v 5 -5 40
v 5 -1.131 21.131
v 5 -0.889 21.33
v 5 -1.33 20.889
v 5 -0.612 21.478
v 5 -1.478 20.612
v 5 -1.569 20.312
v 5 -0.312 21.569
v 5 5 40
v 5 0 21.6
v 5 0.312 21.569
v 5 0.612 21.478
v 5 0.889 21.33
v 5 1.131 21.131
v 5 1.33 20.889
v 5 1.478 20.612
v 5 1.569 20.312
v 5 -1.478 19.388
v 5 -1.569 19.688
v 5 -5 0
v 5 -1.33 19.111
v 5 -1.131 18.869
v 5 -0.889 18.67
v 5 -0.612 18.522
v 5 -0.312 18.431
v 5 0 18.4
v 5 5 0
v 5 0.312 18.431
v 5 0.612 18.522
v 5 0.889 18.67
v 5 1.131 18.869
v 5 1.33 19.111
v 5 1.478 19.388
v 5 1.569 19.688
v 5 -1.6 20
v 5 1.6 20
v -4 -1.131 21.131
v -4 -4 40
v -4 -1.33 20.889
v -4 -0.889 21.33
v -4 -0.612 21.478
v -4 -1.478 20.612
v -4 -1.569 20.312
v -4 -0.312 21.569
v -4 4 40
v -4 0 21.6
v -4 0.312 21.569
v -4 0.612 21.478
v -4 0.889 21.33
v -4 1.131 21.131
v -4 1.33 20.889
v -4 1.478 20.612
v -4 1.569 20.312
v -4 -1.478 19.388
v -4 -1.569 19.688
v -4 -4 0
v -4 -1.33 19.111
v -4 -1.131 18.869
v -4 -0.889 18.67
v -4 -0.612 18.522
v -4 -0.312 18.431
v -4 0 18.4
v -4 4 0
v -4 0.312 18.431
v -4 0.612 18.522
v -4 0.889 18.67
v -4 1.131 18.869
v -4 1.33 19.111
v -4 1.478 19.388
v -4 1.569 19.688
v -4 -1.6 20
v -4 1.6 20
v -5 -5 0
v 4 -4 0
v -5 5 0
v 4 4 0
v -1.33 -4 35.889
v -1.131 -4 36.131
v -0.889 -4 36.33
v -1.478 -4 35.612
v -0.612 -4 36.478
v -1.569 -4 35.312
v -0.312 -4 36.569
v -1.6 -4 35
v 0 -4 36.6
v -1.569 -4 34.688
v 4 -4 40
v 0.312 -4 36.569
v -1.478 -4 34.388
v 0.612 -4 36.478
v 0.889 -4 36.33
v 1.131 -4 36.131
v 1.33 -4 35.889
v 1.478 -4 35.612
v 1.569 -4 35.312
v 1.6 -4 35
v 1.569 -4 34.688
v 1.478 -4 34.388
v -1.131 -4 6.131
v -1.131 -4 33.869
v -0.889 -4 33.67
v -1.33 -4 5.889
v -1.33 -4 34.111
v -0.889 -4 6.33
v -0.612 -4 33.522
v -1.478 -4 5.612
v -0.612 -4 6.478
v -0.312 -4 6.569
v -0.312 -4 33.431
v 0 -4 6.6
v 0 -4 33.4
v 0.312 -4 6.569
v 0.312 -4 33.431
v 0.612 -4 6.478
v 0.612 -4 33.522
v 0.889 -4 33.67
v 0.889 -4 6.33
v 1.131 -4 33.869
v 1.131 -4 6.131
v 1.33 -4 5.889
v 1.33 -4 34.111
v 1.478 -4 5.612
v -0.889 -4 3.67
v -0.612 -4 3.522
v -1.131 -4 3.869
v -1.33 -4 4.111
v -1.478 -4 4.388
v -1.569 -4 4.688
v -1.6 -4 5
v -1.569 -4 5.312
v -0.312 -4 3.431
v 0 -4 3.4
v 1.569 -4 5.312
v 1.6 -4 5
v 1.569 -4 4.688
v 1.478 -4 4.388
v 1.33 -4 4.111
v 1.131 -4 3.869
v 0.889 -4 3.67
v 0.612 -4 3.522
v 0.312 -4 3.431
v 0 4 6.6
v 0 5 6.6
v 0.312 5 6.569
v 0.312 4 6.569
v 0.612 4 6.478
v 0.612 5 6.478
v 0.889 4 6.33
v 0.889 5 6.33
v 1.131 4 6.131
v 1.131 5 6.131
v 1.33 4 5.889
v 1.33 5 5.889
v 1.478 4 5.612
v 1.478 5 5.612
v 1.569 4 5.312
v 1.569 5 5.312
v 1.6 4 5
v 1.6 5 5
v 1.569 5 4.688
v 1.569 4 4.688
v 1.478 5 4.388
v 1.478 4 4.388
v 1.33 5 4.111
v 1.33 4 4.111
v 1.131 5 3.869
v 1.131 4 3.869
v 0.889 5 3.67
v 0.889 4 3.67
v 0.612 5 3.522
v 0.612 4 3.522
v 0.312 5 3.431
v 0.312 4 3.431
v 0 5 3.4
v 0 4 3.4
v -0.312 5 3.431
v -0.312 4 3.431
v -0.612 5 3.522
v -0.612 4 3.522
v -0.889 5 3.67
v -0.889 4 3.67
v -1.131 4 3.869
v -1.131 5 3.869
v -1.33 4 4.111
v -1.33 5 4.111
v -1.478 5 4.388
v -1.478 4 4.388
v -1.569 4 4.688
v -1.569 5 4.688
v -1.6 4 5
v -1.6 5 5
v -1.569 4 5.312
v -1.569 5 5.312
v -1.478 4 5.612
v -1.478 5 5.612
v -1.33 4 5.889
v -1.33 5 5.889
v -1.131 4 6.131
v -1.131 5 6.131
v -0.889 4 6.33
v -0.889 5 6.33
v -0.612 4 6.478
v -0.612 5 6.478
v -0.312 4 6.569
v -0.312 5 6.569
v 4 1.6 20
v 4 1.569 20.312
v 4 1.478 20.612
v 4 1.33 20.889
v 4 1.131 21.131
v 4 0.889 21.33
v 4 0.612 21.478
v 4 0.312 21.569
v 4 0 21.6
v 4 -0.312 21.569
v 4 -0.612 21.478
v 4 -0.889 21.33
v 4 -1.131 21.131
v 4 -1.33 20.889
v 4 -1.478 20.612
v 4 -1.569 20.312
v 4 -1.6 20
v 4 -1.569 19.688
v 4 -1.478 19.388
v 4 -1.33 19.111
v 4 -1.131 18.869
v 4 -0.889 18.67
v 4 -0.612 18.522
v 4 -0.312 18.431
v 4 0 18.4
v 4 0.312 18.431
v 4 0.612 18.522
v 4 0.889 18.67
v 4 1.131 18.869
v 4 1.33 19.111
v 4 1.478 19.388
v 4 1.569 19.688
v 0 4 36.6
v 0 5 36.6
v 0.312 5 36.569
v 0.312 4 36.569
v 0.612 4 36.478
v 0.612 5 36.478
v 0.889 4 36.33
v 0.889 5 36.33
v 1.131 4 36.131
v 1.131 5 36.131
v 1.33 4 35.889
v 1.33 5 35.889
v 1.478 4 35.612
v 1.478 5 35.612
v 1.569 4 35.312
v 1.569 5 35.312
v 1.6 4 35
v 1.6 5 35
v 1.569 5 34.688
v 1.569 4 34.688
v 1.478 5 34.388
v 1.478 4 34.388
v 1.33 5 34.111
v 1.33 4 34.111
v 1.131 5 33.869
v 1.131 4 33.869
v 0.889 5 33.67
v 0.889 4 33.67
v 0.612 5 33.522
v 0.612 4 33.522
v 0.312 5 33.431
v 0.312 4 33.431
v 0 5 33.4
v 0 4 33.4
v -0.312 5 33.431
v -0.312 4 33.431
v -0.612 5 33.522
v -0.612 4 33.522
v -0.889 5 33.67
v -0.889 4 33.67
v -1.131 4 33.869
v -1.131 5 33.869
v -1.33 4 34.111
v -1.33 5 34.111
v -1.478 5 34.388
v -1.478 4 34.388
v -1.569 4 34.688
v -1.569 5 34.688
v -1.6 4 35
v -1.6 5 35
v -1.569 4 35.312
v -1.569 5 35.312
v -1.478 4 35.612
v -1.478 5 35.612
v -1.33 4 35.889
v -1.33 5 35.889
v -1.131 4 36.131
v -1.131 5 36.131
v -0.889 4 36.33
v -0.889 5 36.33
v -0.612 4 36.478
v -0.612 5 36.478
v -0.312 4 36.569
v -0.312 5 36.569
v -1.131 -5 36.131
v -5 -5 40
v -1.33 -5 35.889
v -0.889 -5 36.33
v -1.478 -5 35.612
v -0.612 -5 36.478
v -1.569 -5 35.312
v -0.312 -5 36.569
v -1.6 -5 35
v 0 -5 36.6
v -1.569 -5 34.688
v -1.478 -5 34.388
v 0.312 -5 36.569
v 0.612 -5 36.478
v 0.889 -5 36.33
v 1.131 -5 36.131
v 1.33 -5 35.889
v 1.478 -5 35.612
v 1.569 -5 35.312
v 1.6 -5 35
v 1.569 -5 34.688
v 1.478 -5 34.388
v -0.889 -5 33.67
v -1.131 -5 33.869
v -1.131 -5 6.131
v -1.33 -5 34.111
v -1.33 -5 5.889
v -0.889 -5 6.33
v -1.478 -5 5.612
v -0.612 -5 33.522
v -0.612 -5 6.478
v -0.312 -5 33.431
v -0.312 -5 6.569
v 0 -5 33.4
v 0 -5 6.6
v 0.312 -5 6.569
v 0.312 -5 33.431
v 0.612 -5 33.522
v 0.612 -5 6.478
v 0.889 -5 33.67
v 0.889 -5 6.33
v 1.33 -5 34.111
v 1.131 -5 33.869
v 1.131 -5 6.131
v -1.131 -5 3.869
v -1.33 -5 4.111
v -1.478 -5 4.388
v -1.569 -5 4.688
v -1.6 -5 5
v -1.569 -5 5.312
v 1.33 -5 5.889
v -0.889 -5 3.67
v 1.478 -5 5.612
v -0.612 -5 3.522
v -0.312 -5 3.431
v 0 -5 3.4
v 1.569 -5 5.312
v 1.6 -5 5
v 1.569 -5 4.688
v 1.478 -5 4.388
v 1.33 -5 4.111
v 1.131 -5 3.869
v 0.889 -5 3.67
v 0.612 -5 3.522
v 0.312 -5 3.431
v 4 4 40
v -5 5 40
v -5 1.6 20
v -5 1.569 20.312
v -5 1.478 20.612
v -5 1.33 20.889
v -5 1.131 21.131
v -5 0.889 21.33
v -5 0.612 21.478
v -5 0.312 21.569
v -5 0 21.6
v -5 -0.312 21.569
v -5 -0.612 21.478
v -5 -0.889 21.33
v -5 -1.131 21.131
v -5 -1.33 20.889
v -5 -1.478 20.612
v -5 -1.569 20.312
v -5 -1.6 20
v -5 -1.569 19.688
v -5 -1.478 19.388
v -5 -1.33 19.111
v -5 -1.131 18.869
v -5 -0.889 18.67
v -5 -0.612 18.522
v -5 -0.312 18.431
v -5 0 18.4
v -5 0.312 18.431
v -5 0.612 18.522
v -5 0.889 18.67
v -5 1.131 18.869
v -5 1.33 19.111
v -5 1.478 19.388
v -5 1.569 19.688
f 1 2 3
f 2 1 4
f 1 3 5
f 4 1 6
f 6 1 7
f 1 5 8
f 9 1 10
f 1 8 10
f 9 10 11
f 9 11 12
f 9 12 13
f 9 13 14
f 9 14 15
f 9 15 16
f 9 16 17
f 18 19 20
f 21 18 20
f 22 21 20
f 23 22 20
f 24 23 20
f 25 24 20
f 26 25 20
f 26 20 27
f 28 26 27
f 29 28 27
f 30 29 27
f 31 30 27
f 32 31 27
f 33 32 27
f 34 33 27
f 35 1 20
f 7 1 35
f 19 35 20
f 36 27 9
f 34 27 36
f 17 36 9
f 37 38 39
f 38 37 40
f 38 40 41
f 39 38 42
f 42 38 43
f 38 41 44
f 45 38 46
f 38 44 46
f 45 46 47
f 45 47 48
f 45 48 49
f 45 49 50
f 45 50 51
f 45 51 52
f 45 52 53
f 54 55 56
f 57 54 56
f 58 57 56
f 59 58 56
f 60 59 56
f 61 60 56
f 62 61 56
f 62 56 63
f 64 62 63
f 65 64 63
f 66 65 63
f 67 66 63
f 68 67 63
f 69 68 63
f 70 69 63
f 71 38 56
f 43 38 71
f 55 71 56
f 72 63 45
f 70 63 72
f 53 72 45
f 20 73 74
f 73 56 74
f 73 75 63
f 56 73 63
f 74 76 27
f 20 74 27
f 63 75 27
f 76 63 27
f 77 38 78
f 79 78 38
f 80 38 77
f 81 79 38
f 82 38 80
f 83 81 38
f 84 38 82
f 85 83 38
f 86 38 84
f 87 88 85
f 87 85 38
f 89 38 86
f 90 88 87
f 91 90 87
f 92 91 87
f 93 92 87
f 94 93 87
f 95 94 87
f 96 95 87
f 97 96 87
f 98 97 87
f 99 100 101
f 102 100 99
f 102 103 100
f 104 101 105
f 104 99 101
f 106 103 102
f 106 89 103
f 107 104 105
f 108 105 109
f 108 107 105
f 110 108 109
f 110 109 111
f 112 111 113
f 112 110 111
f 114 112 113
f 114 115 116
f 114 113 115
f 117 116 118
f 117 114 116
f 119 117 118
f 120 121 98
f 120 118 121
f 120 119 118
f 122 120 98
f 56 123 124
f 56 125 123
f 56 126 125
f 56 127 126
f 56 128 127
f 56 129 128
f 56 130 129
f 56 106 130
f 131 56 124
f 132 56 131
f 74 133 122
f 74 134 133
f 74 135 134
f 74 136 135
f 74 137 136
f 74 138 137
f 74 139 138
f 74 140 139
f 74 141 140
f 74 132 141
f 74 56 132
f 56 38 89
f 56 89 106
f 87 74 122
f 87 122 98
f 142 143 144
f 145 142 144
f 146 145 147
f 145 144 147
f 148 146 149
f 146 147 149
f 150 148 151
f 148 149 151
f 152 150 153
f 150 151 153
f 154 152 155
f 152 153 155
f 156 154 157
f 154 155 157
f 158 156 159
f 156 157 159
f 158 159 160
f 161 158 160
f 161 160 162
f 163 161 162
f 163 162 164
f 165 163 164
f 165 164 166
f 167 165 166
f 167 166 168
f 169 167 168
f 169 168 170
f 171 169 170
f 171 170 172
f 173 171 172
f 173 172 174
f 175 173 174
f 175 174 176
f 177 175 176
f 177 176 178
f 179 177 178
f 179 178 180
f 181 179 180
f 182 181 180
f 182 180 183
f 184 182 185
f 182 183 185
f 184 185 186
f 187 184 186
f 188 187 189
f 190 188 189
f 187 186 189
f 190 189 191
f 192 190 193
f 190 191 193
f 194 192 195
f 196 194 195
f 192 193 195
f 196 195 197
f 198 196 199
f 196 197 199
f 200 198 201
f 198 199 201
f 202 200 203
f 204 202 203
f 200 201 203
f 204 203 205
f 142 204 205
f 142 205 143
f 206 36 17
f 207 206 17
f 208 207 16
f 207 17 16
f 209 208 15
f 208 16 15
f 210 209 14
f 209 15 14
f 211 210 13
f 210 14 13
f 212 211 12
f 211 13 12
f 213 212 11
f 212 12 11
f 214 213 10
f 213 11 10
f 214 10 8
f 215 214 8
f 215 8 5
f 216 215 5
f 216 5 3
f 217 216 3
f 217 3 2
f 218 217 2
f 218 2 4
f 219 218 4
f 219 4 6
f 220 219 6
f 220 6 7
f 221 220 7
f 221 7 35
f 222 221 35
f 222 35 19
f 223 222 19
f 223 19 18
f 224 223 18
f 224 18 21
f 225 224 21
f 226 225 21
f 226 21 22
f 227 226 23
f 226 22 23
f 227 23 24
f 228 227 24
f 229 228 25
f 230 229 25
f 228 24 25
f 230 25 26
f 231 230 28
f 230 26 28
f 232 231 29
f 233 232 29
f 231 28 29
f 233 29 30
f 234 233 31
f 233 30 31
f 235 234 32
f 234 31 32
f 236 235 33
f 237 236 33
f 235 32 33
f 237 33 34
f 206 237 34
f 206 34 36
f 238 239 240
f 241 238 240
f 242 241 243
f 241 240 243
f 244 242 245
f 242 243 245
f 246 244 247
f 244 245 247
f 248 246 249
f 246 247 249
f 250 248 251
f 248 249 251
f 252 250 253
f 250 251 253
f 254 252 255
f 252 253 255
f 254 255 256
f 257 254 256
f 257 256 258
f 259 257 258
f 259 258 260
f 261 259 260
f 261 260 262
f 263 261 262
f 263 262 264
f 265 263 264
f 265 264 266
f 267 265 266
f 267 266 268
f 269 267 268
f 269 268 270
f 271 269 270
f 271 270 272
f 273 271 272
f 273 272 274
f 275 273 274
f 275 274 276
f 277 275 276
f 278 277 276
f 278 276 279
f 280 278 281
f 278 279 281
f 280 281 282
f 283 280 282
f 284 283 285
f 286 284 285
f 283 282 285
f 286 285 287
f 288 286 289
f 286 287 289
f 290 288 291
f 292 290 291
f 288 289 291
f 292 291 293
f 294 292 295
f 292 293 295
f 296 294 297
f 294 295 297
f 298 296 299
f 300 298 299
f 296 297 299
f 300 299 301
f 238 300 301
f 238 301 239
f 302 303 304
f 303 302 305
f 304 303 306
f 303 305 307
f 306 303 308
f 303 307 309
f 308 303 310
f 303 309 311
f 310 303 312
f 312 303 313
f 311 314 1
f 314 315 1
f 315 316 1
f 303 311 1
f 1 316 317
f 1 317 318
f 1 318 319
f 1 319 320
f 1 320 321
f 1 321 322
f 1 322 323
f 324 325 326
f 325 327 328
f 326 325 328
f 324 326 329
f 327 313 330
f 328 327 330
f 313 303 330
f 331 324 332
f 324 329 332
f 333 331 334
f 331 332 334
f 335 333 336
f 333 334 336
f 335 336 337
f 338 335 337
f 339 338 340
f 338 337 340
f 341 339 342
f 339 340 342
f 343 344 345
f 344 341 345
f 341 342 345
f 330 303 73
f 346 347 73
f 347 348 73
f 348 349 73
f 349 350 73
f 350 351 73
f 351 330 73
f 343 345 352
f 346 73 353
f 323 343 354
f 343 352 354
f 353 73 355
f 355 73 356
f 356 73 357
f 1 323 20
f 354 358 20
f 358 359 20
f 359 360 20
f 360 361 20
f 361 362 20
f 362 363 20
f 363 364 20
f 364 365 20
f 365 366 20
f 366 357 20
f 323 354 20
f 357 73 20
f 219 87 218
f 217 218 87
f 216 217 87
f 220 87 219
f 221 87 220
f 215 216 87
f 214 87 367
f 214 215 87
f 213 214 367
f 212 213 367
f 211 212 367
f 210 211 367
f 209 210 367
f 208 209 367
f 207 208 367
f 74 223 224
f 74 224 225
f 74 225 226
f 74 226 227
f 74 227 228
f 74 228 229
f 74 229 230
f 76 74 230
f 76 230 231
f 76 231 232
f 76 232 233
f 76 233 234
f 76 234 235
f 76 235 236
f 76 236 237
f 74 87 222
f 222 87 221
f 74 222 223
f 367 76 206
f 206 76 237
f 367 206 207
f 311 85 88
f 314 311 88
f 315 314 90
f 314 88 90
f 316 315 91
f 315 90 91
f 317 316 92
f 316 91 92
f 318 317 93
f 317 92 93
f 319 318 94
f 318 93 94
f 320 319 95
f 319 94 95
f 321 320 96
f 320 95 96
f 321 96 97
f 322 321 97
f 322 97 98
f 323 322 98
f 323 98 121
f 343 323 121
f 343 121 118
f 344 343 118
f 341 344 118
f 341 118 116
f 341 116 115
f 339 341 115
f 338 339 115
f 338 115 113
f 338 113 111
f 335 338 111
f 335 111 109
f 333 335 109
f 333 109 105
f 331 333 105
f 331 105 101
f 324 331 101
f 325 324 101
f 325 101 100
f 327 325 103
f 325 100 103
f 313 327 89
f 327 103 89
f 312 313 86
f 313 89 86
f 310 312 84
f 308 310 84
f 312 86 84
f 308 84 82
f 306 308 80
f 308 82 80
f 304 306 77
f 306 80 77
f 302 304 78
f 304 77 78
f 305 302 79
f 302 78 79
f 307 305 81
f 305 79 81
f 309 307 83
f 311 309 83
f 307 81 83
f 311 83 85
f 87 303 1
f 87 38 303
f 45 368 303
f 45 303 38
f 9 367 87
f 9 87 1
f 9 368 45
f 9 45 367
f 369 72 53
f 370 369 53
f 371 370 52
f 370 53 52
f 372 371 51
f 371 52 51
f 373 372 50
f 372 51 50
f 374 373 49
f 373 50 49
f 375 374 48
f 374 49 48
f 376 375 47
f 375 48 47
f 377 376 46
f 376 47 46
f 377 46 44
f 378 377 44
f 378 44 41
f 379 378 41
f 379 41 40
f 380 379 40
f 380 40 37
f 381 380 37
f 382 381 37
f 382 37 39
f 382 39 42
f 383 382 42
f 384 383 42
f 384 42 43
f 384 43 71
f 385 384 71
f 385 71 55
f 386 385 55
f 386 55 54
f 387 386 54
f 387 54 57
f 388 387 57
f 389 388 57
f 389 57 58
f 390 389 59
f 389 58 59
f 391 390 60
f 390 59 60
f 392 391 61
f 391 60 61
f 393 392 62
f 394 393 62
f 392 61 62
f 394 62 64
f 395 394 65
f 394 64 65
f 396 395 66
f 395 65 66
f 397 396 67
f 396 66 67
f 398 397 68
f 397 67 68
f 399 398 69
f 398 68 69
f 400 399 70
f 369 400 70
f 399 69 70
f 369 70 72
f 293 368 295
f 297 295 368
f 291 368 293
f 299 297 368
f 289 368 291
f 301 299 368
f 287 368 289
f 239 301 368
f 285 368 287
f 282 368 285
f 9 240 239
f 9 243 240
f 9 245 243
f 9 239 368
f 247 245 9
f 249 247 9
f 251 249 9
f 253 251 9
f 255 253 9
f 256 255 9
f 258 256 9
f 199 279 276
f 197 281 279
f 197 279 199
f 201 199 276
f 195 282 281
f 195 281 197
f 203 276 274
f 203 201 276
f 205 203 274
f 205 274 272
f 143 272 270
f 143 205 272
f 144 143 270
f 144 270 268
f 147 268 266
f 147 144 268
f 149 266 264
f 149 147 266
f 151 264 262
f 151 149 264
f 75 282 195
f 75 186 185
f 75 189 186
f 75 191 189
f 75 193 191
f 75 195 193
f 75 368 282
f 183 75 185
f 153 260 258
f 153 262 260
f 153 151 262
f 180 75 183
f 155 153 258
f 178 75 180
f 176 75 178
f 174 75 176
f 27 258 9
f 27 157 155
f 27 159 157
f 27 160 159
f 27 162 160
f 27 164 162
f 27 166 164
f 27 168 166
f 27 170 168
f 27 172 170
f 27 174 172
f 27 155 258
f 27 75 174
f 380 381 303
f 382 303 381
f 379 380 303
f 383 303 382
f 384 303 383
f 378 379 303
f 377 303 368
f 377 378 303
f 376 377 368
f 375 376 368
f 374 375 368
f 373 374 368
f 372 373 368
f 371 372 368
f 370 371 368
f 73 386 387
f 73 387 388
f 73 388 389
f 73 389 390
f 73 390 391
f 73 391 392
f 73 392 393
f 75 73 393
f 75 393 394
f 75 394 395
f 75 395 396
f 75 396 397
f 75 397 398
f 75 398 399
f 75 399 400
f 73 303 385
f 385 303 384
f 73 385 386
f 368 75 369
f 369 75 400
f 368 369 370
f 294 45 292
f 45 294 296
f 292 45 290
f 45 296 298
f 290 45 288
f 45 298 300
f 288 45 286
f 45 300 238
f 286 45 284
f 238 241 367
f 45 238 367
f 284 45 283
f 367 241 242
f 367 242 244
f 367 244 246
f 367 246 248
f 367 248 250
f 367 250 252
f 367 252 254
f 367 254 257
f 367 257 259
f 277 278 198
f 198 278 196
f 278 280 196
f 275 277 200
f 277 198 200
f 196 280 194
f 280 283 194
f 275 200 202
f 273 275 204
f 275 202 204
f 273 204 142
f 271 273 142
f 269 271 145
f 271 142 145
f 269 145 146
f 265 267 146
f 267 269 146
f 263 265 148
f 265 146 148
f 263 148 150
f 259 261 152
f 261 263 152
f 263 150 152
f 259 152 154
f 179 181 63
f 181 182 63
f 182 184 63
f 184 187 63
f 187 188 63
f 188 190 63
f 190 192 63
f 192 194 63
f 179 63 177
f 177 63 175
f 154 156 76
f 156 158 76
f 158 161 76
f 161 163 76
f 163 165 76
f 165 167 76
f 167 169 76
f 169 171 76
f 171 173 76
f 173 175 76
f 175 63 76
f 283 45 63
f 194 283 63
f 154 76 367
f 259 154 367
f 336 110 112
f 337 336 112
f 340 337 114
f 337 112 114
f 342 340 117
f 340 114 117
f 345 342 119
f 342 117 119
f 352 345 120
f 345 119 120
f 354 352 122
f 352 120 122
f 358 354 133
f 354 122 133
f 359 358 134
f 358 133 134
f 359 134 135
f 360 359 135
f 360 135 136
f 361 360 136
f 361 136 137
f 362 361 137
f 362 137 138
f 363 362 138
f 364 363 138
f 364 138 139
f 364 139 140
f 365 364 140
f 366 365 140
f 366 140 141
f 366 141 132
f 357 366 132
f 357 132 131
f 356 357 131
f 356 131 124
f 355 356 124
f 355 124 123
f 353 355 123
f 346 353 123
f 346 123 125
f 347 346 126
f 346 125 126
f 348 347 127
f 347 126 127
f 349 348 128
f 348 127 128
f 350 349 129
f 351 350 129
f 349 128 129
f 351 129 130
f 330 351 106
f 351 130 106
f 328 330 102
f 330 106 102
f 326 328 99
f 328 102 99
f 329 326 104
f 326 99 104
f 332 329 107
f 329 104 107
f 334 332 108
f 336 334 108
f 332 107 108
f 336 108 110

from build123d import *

# Parameters (mm, degrees)
SKETCH_1_W          = 10
SKETCH_1_H          = 10
SKETCH_1_W_2        = 8
SKETCH_1_H_2        = 8
EXTRUDE_1_DEPTH     = 40
SKETCH_2_R          = 1.6
CUT_EXTRUDE_1_DEPTH = 408.37168574
SKETCH_3_R          = 1.6
CUT_EXTRUDE_2_DEPTH = 10


with BuildPart() as part:
    # ｽｹｯﾁ1 → ﾎﾞｽ - 押し出し1 (new body)
    with BuildSketch(Plane.XY):
        Rectangle(SKETCH_1_W, SKETCH_1_H)
        Rectangle(SKETCH_1_W_2, SKETCH_1_H_2, mode=Mode.SUBTRACT)
    extrude(amount=EXTRUDE_1_DEPTH)

    # ｽｹｯﾁ2 → ｶｯﾄ - 押し出し1 (cut)
    with BuildSketch(Plane(origin=(0, 5, 0), x_dir=(1, 0, 0), z_dir=(0, 1, 0))):
        with Locations(Location((0, -5, 0), (0, 0, 270))):
            Circle(SKETCH_2_R)
        with Locations(Location((0, -35, 0), (0, 0, 270))):
            Circle(SKETCH_2_R)
    extrude(amount=-CUT_EXTRUDE_1_DEPTH, mode=Mode.SUBTRACT)

    # ｽｹｯﾁ3 → ｶｯﾄ - 押し出し2 (cut)
    with BuildSketch(Plane(origin=(5, 0, 0), x_dir=(0, 0, -1), z_dir=(1, 0, 0))):
        with Locations(Location((-20, 0, 0), (0, 0, 90))):
            Circle(SKETCH_3_R)
    extrude(amount=-CUT_EXTRUDE_2_DEPTH, mode=Mode.SUBTRACT)


solid = part.part
